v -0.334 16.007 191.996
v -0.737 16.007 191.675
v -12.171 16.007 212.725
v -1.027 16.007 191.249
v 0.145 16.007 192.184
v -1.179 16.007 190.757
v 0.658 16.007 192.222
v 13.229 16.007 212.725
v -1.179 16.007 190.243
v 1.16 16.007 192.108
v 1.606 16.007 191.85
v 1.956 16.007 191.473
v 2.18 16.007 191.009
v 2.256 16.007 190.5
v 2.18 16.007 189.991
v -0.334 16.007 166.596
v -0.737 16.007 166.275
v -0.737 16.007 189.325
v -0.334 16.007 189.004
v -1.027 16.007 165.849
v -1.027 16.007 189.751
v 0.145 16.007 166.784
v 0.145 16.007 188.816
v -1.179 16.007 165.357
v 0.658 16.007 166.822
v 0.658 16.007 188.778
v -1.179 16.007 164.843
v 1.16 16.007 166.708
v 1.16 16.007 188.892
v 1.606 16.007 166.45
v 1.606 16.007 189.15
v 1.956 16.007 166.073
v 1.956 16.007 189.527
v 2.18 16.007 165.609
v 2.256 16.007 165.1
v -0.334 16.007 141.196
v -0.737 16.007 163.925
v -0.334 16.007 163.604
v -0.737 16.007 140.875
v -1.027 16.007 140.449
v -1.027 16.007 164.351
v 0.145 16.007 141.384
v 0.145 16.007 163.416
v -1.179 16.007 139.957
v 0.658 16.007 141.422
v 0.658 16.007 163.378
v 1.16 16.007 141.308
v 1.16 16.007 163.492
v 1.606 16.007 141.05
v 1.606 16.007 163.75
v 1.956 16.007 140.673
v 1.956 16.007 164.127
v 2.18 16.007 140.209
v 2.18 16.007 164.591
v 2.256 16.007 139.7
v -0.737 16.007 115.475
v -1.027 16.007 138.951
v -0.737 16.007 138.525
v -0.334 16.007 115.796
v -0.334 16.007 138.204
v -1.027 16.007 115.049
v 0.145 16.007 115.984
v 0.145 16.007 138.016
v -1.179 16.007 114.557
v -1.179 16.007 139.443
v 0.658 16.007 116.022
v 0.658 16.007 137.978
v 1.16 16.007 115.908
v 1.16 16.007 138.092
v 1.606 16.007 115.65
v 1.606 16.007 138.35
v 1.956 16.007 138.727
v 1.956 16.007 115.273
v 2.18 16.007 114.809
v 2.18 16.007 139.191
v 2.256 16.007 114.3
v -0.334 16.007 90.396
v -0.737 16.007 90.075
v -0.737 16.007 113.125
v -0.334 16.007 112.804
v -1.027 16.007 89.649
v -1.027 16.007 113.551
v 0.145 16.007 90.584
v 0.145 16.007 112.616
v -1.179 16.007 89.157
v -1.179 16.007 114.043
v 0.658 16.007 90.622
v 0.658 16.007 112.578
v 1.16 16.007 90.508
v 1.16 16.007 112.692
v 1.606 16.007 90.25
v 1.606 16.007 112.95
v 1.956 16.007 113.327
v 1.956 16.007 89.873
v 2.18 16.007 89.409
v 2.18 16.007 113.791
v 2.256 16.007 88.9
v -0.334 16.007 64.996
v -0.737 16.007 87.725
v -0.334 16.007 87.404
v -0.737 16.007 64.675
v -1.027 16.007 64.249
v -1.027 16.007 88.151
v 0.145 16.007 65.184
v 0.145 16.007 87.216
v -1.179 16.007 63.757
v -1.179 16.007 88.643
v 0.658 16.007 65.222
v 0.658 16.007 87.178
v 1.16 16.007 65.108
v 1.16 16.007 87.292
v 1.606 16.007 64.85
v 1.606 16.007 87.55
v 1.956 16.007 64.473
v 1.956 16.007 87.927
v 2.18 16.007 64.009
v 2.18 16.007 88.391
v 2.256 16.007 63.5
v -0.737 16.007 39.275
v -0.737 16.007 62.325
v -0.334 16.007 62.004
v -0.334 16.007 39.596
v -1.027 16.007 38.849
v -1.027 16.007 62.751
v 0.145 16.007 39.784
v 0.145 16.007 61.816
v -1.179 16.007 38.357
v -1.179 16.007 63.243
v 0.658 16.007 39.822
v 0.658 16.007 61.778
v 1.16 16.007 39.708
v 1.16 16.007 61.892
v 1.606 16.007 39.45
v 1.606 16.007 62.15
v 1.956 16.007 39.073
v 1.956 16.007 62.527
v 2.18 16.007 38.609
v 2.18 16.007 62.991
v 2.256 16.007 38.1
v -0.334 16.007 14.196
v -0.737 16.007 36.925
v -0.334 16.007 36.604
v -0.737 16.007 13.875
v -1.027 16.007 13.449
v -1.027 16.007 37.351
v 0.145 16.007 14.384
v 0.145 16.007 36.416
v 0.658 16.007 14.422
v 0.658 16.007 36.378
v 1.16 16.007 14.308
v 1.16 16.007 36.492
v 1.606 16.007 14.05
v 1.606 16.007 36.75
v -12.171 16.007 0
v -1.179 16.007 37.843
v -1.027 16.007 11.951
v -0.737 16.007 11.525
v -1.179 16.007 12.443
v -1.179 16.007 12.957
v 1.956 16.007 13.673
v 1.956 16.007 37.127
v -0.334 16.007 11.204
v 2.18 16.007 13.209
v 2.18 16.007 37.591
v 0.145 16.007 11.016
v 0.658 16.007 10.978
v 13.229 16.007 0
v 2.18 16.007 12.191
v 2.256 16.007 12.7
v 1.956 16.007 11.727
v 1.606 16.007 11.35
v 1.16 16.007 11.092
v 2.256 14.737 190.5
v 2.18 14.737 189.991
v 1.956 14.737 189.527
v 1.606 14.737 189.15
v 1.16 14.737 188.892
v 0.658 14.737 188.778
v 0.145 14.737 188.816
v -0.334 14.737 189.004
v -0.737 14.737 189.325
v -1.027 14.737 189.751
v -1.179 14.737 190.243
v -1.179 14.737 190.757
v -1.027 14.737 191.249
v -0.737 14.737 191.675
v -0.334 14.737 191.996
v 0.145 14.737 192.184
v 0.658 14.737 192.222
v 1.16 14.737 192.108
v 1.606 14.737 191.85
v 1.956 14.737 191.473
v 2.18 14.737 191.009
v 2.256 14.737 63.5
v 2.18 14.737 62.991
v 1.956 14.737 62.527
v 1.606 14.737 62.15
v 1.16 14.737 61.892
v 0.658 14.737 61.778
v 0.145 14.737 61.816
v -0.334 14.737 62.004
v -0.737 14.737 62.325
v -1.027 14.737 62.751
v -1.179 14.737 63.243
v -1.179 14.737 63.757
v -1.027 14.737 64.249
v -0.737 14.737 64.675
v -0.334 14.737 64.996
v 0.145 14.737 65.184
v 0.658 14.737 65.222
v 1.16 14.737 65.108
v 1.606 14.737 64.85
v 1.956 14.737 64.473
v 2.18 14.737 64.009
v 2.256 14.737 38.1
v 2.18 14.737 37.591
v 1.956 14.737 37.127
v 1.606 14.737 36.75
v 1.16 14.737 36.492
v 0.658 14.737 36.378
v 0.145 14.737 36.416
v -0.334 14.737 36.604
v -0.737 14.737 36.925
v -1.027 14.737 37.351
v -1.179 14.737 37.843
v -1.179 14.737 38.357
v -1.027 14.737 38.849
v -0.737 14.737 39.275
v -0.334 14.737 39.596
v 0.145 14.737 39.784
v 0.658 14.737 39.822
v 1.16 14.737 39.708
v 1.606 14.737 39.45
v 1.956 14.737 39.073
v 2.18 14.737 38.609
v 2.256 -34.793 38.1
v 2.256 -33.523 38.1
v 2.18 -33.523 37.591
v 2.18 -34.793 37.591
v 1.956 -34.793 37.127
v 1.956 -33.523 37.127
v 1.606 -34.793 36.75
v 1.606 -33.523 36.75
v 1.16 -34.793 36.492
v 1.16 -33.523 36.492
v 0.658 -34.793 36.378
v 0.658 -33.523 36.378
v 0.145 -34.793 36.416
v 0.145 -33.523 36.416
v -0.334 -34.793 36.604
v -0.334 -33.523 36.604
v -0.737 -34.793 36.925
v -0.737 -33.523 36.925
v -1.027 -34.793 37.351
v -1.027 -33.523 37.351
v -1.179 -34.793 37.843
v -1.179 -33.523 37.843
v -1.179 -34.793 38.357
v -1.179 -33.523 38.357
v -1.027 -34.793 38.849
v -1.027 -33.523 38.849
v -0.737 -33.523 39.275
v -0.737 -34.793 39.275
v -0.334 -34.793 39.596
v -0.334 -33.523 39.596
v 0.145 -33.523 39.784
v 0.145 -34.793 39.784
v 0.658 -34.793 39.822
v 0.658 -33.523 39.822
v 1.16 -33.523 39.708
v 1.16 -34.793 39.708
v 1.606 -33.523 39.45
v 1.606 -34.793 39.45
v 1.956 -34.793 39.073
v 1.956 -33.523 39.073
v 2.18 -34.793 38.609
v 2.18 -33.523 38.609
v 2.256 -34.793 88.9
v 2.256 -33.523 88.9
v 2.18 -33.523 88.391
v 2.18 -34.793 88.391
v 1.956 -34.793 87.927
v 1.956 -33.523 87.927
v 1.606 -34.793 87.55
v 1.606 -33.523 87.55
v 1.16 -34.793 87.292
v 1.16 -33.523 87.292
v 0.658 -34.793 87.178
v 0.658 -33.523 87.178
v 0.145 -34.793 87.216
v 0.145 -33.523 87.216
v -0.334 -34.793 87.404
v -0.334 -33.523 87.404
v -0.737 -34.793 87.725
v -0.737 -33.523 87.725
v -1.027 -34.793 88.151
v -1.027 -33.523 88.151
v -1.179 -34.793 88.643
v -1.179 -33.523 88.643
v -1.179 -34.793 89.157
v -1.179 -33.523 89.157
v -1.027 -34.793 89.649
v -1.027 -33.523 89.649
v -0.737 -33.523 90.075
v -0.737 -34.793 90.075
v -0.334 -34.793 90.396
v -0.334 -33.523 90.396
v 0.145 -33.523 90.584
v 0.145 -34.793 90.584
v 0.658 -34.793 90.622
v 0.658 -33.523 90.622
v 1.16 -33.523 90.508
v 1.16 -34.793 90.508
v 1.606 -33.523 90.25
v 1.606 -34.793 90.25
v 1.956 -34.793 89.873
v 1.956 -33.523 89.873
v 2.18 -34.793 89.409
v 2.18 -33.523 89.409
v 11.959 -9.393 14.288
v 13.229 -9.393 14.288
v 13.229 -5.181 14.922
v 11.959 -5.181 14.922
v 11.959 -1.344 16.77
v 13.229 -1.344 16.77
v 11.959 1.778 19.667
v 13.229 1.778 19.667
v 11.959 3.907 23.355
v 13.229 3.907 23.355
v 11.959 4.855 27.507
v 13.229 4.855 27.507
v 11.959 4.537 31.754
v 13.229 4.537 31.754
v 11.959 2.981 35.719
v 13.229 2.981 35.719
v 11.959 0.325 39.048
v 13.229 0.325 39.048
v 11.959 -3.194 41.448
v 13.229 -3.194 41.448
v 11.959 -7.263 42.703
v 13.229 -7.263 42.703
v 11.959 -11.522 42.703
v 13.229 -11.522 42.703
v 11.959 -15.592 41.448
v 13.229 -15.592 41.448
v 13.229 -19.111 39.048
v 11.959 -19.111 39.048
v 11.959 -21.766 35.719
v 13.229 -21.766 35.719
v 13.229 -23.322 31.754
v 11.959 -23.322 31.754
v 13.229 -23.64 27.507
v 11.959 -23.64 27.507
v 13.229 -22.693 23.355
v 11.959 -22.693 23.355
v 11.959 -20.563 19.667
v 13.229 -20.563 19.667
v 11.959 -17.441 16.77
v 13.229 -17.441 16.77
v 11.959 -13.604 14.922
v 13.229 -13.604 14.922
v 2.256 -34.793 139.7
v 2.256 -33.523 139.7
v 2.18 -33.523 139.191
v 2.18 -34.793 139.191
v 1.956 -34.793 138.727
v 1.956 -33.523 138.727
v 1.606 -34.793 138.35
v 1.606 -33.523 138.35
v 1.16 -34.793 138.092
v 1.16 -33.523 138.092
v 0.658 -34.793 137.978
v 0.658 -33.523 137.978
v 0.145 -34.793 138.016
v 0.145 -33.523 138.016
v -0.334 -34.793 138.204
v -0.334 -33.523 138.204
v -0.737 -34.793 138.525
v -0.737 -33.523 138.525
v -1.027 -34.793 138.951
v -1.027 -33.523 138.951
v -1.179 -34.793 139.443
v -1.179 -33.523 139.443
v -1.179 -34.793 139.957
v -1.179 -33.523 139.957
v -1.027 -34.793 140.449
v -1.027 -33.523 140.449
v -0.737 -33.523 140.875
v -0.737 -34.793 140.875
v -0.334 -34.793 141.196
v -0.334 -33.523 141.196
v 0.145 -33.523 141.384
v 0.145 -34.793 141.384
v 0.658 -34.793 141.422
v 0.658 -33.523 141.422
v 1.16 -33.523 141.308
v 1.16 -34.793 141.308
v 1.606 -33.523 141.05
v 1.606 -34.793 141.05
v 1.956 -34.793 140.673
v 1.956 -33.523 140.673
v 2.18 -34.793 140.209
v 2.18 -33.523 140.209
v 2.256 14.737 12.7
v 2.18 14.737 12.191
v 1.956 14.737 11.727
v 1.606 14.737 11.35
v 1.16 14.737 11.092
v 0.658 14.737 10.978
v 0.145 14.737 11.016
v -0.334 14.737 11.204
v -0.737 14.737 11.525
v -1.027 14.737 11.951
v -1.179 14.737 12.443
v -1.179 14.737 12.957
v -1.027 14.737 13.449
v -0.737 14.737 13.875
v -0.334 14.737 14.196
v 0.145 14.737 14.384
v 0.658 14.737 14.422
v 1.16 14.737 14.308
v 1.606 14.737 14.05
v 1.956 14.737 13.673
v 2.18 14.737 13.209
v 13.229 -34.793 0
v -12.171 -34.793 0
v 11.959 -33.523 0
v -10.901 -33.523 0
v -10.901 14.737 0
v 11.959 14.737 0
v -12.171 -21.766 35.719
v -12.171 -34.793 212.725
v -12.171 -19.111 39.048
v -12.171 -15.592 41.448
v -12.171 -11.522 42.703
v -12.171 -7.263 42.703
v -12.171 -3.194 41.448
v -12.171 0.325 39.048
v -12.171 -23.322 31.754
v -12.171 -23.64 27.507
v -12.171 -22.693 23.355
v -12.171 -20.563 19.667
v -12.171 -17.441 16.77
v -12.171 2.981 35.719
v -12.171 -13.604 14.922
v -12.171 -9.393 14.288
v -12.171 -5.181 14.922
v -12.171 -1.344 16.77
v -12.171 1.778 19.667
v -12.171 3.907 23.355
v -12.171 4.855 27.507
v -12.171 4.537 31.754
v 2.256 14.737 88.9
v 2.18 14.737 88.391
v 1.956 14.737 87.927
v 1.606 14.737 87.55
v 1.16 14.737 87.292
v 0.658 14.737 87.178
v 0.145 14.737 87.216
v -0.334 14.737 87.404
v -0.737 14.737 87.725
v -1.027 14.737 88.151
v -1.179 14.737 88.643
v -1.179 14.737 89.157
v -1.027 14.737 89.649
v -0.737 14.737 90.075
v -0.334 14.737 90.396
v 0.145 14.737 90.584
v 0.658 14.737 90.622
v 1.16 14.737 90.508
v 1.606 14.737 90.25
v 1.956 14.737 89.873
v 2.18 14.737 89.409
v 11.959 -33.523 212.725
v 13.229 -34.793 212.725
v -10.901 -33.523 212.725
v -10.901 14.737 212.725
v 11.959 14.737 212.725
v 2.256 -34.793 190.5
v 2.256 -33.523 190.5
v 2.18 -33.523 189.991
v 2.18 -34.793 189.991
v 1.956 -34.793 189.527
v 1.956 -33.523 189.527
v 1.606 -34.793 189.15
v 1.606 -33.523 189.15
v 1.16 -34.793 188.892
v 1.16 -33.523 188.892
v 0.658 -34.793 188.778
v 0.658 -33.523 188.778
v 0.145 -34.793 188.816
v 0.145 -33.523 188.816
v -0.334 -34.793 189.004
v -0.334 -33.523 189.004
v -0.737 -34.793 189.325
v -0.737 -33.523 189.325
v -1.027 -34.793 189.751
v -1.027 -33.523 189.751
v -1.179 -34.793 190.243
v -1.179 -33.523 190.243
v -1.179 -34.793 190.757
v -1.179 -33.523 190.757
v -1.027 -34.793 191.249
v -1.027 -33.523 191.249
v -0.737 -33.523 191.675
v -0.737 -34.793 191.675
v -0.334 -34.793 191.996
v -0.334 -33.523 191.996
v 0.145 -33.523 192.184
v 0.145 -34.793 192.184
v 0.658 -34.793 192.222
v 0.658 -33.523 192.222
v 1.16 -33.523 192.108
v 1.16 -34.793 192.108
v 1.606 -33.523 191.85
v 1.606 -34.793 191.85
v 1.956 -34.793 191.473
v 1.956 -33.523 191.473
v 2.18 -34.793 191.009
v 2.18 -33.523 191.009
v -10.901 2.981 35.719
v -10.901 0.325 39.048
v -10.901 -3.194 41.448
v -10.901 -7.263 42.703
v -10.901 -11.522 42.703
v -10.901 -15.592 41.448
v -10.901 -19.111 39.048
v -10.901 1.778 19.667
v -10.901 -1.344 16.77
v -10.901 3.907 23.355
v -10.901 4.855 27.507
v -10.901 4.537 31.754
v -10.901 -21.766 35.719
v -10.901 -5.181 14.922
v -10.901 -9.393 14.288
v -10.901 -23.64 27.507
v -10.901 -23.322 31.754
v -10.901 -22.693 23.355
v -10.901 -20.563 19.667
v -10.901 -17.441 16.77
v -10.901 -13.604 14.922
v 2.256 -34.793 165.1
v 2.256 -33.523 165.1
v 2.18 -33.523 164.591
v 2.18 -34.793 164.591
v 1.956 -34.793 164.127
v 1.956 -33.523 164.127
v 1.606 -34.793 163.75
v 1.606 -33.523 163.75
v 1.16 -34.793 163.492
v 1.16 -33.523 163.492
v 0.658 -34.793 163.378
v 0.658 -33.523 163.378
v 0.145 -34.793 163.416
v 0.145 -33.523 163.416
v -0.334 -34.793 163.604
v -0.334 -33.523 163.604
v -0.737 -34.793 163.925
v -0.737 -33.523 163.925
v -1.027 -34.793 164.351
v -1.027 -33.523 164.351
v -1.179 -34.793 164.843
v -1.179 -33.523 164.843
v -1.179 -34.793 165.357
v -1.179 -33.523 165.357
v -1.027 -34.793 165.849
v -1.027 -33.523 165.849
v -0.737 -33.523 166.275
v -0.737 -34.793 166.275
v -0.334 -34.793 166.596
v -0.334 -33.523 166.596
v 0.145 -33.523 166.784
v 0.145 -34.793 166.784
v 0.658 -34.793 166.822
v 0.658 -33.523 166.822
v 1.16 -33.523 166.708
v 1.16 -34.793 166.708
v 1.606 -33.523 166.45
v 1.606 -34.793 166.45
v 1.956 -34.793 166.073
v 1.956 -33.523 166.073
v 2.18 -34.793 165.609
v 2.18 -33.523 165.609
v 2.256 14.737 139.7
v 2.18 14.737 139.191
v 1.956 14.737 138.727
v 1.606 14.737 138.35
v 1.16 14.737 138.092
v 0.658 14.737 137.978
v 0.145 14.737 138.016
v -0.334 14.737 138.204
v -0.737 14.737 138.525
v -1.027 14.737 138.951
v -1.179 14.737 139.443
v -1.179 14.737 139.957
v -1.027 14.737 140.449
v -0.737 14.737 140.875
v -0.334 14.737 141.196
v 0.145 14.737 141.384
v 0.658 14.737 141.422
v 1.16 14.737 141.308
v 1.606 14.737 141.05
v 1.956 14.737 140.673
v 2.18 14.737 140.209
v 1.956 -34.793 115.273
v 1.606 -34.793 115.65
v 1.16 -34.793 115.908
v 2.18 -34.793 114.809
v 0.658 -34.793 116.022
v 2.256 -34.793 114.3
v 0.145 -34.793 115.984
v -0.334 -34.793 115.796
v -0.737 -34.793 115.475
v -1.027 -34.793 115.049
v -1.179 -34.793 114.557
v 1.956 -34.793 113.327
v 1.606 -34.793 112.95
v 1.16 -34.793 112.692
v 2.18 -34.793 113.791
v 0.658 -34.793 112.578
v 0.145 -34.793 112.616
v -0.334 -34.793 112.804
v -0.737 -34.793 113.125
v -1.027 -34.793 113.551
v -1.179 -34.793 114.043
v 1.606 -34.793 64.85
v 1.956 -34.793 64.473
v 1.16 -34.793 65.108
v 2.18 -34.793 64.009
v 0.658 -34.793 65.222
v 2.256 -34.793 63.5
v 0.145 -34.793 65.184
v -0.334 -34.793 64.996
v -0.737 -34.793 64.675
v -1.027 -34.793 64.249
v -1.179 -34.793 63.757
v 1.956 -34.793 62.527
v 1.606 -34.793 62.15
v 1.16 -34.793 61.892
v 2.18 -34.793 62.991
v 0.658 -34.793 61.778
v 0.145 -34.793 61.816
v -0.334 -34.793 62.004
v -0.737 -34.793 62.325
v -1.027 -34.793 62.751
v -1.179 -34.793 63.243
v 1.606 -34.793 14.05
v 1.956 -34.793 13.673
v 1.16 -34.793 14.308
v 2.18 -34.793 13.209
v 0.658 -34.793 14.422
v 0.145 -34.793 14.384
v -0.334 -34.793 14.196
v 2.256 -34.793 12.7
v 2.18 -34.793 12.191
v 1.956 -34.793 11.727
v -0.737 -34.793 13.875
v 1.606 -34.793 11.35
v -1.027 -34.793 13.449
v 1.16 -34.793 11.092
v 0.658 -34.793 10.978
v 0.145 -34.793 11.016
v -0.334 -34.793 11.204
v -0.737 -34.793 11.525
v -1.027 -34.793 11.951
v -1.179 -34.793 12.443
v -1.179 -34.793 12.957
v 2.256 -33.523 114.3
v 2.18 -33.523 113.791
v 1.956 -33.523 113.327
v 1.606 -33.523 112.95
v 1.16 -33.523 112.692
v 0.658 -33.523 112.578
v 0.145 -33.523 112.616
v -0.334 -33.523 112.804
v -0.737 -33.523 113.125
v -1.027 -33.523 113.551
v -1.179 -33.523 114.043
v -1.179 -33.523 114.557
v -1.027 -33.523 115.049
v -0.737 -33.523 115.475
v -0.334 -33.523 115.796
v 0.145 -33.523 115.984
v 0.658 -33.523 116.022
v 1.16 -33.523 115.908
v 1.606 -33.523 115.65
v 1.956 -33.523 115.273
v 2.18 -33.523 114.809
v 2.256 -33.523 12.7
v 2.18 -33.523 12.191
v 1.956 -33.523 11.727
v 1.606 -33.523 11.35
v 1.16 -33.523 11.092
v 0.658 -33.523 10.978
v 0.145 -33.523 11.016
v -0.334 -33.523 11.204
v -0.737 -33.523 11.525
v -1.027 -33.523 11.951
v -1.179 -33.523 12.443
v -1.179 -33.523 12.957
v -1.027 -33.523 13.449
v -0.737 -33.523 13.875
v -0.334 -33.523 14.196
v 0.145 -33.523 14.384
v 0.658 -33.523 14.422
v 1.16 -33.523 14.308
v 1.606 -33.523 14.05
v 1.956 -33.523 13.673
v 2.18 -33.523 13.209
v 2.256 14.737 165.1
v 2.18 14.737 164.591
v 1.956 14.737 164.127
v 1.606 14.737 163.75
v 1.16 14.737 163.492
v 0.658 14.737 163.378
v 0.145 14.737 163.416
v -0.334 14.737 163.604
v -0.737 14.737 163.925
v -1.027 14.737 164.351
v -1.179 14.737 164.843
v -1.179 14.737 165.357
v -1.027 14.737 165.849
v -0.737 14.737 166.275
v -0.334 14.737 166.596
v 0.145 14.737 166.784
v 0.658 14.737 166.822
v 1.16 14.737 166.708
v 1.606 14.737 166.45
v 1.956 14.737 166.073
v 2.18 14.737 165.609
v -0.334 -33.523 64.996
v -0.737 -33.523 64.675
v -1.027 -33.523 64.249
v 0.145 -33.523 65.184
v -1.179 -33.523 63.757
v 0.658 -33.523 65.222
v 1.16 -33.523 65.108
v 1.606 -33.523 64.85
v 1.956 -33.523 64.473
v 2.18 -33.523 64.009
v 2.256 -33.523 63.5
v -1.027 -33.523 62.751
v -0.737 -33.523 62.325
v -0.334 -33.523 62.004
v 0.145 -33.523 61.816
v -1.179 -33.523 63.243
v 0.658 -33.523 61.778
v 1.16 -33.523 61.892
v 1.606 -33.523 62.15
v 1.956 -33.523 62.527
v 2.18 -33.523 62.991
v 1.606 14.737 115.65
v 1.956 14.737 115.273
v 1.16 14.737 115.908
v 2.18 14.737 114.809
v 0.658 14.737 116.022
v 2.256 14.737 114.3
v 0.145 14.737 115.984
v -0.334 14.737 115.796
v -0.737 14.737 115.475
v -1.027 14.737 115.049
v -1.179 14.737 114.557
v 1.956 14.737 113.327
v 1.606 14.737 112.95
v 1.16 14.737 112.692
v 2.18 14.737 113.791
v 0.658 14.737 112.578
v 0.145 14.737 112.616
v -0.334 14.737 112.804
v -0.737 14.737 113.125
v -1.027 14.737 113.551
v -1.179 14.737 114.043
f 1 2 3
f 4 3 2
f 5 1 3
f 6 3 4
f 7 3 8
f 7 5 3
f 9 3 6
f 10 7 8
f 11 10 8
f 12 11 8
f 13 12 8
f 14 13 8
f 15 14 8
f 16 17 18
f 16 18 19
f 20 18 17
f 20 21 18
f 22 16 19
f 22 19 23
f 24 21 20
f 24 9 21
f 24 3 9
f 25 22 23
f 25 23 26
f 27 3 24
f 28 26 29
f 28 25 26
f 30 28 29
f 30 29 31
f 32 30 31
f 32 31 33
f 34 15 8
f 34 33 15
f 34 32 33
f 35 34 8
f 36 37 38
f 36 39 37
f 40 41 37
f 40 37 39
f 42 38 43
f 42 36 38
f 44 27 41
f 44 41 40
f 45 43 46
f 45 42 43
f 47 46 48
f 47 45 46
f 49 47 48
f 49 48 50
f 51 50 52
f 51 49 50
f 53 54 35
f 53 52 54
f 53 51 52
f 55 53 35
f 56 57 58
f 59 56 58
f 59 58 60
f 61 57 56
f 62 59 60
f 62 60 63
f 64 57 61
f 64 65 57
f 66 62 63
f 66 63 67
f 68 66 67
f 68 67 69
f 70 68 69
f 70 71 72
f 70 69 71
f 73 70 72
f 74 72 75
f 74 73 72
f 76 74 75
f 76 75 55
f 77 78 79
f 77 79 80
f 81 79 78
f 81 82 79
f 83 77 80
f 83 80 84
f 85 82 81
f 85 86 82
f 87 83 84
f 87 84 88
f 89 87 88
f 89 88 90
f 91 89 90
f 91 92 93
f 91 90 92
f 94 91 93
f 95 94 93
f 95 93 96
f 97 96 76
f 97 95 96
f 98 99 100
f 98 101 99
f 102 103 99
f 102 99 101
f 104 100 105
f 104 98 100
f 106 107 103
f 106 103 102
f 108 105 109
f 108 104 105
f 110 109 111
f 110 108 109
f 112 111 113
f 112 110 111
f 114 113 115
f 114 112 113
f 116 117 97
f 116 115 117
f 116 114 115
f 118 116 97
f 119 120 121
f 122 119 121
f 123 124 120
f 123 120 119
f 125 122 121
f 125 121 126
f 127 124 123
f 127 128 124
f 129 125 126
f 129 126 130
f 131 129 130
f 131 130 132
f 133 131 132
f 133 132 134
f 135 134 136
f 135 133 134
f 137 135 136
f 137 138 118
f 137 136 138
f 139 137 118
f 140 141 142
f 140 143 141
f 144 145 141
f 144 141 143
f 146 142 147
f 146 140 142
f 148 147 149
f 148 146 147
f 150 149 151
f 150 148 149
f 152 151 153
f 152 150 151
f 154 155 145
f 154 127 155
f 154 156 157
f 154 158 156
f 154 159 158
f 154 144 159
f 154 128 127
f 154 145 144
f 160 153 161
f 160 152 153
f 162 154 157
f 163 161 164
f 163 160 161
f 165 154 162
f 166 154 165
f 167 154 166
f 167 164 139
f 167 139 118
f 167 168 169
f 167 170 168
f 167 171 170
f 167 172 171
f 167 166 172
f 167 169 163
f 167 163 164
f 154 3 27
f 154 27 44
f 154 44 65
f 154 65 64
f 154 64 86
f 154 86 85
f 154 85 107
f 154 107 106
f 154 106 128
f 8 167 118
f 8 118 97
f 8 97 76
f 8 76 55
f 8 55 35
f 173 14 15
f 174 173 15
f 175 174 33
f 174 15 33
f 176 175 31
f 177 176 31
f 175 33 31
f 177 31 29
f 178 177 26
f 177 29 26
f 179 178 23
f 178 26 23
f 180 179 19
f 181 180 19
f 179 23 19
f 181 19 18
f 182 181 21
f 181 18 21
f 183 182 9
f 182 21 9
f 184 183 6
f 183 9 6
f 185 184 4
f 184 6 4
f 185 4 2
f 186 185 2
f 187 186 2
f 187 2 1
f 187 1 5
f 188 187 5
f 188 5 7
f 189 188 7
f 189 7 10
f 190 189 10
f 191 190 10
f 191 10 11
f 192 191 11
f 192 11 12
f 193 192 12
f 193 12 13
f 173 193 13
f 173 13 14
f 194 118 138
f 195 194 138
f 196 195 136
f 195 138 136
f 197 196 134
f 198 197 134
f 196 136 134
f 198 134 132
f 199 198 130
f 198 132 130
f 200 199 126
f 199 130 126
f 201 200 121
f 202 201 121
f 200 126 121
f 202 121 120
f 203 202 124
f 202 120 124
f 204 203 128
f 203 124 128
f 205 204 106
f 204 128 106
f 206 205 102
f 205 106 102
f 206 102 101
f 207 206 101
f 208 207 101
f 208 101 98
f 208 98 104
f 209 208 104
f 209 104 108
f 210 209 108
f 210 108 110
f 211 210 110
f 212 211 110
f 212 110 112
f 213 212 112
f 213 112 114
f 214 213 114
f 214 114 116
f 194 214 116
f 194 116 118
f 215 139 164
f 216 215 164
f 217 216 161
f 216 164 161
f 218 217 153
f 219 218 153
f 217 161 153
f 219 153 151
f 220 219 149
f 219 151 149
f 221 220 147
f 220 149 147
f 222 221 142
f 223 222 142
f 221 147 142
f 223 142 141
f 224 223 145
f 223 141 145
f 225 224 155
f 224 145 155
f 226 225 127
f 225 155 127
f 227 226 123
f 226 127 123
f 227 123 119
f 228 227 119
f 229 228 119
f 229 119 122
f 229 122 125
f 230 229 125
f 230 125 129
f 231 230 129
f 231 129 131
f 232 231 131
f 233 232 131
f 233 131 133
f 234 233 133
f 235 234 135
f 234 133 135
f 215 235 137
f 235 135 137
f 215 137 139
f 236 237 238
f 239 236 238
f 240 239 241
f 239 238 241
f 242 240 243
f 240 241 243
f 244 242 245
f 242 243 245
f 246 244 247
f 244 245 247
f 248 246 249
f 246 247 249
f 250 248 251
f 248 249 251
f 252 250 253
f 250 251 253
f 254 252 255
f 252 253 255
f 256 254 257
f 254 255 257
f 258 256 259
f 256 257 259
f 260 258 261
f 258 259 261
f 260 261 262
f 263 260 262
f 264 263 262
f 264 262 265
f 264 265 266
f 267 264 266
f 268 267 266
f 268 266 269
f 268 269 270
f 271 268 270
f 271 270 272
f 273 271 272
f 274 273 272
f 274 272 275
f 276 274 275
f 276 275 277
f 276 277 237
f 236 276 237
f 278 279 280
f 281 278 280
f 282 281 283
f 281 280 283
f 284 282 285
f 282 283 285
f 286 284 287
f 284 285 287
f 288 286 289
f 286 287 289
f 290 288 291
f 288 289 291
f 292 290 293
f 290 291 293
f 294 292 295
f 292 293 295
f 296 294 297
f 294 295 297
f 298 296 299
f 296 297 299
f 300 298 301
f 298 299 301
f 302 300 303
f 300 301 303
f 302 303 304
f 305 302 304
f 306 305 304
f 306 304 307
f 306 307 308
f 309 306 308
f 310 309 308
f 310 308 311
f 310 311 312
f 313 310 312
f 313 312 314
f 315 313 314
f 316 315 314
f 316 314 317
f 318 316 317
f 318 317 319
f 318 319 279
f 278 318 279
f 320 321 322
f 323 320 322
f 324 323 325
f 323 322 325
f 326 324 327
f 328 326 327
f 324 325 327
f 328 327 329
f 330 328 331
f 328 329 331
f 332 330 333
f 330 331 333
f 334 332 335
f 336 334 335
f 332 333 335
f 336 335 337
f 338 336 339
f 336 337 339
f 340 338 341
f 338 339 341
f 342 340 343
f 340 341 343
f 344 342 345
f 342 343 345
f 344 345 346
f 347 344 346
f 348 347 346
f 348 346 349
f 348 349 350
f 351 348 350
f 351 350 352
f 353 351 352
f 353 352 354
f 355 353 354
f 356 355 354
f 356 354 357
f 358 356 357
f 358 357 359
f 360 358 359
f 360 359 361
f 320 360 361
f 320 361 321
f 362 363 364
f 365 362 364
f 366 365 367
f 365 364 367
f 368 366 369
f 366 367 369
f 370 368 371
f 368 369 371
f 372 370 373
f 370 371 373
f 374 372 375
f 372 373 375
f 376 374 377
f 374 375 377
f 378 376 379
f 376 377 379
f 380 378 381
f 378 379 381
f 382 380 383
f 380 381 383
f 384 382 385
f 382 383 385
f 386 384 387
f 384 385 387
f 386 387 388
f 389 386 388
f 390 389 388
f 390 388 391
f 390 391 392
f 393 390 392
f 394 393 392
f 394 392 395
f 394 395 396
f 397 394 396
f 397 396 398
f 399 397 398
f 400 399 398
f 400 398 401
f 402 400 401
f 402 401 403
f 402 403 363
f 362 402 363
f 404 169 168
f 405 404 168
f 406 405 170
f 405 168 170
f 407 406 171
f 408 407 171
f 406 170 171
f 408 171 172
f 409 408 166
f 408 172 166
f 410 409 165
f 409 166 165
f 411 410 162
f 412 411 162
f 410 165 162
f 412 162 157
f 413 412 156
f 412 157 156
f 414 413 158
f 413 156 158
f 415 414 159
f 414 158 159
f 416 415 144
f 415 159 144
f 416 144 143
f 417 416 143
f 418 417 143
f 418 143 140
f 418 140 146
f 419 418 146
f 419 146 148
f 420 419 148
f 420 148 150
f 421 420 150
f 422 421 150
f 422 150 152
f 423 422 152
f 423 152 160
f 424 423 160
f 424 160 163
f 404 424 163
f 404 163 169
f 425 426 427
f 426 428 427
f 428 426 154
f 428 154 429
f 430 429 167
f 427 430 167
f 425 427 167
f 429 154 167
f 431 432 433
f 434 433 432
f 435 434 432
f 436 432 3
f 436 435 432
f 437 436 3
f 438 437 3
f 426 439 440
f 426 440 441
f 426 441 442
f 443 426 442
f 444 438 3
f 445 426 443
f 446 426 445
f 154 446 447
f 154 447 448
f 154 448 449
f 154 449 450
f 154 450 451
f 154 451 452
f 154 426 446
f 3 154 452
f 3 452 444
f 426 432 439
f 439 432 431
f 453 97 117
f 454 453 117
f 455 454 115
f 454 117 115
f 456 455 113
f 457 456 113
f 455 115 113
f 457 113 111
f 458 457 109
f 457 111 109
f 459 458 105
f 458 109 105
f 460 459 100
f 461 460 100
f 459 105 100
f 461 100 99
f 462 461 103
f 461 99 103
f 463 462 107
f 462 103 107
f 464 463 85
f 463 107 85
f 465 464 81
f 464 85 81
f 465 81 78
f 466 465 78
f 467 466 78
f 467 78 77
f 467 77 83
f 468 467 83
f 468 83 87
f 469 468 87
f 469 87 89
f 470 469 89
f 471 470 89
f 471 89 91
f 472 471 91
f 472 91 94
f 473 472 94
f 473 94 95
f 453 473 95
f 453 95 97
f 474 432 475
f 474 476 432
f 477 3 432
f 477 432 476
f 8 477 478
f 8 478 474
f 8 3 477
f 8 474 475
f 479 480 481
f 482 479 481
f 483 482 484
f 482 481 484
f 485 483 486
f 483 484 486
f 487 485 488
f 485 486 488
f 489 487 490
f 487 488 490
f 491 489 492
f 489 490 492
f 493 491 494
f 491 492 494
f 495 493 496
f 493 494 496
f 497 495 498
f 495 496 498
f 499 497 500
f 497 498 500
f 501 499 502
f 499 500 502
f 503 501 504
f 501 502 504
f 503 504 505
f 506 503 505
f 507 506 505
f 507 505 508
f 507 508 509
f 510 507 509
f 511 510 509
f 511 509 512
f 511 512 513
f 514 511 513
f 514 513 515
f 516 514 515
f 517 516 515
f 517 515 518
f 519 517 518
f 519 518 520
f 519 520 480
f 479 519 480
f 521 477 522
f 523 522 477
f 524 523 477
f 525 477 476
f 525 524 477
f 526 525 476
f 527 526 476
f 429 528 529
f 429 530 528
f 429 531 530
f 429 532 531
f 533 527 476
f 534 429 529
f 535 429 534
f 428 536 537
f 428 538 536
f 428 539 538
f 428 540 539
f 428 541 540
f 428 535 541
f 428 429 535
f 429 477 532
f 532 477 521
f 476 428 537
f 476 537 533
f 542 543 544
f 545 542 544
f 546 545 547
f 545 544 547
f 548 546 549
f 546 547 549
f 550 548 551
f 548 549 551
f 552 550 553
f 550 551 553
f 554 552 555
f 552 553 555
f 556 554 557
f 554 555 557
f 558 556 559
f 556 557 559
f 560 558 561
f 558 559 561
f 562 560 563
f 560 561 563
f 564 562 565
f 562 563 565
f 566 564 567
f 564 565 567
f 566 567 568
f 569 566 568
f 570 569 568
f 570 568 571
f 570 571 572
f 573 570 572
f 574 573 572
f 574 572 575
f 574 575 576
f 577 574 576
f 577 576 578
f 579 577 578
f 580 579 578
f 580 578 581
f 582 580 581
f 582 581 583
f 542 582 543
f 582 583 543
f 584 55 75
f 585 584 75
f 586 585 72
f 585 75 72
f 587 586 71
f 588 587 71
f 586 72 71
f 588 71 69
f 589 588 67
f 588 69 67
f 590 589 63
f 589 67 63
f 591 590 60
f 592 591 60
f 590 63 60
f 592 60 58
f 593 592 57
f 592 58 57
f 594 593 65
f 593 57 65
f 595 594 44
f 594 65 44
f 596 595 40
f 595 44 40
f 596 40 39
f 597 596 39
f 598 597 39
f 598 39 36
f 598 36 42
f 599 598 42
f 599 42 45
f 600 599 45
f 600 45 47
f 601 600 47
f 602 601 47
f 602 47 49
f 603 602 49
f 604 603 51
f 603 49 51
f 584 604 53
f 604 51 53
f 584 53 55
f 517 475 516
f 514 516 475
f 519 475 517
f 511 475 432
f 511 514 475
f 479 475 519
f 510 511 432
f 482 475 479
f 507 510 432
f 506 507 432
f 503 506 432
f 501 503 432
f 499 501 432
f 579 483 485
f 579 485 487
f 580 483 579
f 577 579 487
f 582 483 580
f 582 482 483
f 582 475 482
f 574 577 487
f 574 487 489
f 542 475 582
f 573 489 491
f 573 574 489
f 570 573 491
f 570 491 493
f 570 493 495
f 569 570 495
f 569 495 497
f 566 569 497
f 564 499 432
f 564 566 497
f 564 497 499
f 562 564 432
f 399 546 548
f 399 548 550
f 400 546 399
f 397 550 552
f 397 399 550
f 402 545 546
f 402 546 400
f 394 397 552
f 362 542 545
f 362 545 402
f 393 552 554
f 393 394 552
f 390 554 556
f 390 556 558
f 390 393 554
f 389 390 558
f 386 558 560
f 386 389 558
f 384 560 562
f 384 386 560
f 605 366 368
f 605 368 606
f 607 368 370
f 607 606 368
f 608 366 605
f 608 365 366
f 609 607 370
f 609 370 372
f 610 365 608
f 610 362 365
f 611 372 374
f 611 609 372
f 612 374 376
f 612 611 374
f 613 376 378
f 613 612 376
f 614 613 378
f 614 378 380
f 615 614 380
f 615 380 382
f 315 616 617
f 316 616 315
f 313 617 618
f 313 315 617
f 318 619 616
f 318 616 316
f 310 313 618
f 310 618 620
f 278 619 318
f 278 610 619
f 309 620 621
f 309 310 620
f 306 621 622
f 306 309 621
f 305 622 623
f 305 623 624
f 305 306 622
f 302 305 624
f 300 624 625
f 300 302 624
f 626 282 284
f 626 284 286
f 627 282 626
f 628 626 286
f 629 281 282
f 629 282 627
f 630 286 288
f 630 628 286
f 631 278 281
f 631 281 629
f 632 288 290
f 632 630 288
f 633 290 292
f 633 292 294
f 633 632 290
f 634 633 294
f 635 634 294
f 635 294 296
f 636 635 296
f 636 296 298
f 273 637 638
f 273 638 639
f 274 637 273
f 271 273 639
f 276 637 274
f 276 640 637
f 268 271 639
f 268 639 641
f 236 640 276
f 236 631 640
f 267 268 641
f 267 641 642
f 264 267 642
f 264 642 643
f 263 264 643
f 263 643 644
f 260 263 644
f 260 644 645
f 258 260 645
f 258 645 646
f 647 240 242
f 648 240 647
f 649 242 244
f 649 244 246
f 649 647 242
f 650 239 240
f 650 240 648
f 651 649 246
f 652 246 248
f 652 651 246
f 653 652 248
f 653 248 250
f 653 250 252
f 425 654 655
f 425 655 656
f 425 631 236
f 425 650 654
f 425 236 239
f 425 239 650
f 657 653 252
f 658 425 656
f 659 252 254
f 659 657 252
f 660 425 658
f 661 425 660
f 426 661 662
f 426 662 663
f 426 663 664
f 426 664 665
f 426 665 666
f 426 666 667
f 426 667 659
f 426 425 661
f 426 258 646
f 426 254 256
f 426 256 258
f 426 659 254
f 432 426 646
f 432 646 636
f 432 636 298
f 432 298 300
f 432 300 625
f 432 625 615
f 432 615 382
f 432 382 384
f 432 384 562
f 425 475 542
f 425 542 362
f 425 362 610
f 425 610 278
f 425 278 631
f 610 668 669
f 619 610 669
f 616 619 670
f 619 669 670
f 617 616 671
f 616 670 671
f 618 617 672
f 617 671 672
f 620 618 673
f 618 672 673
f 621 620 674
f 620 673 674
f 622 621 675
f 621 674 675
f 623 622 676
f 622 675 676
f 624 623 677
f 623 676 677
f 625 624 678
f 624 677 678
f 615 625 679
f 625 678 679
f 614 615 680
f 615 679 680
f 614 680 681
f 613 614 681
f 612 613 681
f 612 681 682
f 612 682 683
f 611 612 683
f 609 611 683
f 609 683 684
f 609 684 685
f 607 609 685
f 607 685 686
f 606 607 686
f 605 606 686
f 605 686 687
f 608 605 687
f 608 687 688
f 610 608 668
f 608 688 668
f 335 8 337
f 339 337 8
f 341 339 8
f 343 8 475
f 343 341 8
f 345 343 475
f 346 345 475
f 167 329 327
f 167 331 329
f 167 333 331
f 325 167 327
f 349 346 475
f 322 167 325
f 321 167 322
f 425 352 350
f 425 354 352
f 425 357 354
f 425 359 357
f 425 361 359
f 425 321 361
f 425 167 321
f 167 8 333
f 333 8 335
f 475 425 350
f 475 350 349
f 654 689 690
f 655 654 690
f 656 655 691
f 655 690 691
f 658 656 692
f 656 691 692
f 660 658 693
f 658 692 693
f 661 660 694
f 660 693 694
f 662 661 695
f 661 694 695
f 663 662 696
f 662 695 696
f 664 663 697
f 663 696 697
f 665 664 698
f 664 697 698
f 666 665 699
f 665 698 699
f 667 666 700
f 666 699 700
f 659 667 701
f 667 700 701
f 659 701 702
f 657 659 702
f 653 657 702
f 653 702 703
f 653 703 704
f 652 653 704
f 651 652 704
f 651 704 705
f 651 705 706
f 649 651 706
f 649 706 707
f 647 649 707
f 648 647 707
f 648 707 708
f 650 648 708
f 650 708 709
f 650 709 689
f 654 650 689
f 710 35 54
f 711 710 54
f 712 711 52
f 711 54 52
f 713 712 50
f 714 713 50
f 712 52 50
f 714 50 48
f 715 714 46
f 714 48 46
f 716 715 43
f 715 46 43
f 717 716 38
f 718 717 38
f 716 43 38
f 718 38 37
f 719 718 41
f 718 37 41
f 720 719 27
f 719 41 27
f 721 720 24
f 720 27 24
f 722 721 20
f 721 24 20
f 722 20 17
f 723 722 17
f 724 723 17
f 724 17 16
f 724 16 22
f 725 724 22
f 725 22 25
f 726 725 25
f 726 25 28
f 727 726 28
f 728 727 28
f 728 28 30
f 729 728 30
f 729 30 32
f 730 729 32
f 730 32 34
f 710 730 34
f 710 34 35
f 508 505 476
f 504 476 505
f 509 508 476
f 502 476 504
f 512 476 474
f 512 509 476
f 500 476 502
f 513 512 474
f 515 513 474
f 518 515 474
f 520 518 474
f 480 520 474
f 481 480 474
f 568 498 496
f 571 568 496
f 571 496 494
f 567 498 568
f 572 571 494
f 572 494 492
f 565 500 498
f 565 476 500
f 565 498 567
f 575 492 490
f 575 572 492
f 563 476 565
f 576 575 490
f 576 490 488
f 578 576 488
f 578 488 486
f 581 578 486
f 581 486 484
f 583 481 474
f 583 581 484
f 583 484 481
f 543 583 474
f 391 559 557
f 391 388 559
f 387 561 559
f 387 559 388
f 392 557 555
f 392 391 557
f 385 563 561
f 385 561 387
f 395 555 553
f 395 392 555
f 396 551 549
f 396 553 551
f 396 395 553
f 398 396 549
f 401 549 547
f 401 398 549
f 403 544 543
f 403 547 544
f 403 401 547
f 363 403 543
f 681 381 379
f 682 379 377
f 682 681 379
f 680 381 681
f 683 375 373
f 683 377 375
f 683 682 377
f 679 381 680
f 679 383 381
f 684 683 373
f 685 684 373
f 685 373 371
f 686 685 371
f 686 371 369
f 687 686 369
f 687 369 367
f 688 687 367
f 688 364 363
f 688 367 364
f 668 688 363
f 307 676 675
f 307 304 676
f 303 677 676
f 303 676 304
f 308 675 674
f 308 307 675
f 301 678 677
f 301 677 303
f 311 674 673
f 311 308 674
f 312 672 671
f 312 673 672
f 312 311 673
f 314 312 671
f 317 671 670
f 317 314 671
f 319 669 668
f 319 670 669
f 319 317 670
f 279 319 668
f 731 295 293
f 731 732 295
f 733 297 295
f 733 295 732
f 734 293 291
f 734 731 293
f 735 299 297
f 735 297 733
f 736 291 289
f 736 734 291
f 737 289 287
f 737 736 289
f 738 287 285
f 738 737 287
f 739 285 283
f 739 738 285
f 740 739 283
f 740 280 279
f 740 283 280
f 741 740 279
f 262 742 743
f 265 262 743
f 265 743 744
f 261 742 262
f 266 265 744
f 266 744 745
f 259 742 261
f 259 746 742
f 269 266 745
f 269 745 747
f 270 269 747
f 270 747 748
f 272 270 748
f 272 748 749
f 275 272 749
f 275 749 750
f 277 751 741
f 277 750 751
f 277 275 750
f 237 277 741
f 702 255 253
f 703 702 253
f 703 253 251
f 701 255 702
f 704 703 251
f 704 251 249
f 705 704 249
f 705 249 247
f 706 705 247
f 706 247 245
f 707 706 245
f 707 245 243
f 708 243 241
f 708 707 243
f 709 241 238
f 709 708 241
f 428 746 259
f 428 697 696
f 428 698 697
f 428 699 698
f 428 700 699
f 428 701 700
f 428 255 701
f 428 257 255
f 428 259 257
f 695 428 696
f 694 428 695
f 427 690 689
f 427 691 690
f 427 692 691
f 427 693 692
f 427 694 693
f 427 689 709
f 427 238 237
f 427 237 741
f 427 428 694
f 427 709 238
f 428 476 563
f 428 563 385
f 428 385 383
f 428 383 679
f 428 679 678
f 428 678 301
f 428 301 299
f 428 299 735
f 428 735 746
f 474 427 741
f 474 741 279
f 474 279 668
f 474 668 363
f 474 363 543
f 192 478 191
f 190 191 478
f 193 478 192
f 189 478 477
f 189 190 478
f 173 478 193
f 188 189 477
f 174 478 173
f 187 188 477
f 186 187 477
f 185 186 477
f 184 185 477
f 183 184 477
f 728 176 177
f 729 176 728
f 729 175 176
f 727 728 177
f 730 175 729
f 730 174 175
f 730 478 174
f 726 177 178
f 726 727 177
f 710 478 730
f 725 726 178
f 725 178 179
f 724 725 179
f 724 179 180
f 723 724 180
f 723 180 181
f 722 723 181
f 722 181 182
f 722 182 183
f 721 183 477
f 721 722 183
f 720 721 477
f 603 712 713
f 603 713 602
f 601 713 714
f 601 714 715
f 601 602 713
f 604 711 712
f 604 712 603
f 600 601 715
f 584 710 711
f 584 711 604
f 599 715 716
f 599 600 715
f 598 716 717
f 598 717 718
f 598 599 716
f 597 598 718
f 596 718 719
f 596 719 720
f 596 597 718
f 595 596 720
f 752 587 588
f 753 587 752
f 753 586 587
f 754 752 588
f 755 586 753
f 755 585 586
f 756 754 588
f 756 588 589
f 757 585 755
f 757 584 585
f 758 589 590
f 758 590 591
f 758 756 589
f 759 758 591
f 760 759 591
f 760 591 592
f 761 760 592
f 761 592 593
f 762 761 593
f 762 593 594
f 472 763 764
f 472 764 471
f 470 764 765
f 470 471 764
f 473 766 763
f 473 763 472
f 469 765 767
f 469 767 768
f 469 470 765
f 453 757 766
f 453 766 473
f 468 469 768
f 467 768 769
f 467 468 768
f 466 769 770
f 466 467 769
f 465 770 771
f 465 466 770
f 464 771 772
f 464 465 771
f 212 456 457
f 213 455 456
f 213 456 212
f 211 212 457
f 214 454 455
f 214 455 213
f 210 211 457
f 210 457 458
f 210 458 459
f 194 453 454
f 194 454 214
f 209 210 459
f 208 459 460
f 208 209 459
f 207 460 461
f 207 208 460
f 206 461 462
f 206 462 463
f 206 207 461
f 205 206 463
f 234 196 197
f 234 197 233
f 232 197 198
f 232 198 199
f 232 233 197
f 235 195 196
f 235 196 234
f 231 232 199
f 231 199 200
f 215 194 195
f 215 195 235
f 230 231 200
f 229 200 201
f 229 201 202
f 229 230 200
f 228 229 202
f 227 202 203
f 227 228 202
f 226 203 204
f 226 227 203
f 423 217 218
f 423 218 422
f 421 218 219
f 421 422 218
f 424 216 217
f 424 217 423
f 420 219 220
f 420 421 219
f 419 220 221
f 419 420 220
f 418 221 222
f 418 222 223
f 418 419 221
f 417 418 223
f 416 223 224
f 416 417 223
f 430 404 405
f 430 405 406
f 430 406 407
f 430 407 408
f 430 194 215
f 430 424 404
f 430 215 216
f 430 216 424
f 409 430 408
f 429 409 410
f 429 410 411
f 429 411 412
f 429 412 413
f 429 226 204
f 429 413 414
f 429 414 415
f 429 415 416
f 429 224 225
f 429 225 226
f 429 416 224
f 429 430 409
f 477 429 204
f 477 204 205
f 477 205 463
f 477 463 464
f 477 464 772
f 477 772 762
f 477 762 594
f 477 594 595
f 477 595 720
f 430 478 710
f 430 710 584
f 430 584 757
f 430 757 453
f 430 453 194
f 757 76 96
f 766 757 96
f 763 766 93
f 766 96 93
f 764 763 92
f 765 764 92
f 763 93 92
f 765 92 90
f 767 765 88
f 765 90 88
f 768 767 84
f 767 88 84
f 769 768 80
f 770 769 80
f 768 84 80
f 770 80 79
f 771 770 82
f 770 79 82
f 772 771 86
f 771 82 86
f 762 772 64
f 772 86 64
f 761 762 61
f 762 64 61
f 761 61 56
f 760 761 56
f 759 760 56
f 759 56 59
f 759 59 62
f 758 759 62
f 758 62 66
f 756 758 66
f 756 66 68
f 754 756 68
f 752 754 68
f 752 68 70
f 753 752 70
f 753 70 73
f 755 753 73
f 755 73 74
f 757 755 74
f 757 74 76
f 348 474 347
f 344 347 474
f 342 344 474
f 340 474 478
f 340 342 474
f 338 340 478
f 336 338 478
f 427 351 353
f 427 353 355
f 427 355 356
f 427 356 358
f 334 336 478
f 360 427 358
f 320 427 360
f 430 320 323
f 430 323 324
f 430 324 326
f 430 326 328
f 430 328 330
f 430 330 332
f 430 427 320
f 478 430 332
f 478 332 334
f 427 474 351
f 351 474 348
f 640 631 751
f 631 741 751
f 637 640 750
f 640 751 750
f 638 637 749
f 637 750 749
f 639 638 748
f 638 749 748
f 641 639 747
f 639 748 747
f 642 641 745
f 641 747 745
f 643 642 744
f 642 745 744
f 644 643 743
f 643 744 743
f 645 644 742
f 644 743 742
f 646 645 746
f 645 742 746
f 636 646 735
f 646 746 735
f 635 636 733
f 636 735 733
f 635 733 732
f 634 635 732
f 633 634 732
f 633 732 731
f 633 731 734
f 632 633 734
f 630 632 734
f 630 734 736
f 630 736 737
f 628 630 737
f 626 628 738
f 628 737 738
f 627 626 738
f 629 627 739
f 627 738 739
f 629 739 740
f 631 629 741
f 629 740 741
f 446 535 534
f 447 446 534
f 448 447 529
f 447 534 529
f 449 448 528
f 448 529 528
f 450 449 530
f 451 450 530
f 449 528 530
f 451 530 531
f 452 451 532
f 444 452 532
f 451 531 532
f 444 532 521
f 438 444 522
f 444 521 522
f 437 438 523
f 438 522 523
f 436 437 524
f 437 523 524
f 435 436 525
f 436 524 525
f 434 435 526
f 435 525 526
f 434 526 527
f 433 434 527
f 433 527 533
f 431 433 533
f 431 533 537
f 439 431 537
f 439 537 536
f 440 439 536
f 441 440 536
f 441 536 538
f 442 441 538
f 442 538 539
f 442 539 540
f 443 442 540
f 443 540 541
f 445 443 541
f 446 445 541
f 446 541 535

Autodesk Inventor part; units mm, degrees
ref_plane "YZ Plane" through (0, 0, 0) normal (1, 0, 0) x (0, 1, 0)
ref_plane "XZ Plane" through (0, 0, 0) normal (0, 1, 0) x (-1, 0, 0)
ref_plane "XY Plane" through (0, 0, 0) normal (0, 0, 1) x (1, 0, 0)
sketch "Sketch1" plane through (0, 0, 0) normal (0, 0, 1) x (1, 0, 0)
  line L0 (-12.1708, 16.0073) -> (13.2292, 16.0073)
  line L1 (13.2292, 16.0073) -> (13.2292, -34.7927)
  line L2 (13.2292, -34.7927) -> (-12.1708, -34.7927)
  line L3 (-12.1708, -34.7927) -> (-12.1708, 16.0073)
  line L4 (11.9592, 14.7373) -> (-10.9008, 14.7373)
  line L5 (-10.9008, 14.7373) -> (-10.9008, -33.5227)
  line L6 (-10.9008, -33.5227) -> (11.9592, -33.5227)
  line L7 (11.9592, -33.5227) -> (11.9592, 14.7373)
  point P0 (0, 0)
  dimension "d0" = 25.4
  dimension "d1" = 50.8
  dimension "d2" = 1.27
extrude "Extrusion1" add sketch "Sketch1" along normal blind 212.725
sketch "Sketch2" plane through (-12.1708, 16.0073, 0) normal (0, 1, 0) x (1, 0, 0)
  circle A0 centre (12.7, -12.7) radius 1.7272
  line L0 (25.4, 0) -> (0, 0) projected
  line L1 (0, 0) -> (0, -212.725) projected
  point P0 (12.1708, 0)
  dimension "d5" = 3.4544
  dimension "d6" = 12.7
  dimension "d7" = 12.7
extrude "Extrusion2" cut sketch "Sketch2" against normal through all
pattern_linear "Rectangular Pattern1" count 21 spacing 25.4 along (0, 0, 1) of "Extrusion2"
sketch "Sketch5" plane through (13.2292, -34.7927, 0) normal (1, 0, 0) x (0, 0, -1)
  line L0 (-212.725, 0) -> (-212.725, 50.8) projected
  line L1 (0, 50.8) -> (-212.725, 50.8) projected
  circle A0 centre (-28.575, 25.4) radius 14.2875
  line L2 (0, 0) -> (-212.725, 0) projected
  point P0 (0, 34.7927)
  dimension "d52" = 28.575
  dimension "d54" = 25.4
  dimension "d62" = 25.4
  dimension "d63" = 28.575
extrude "Extrusion5" cut sketch "Sketch5" against normal through all
equation "\"d3\" = d13"
equation "\"d10\" = d14"
equation "\"d13\" = 212.725"
equation "\"d14\" = d13"
equation "\"d32\" = 101.6"
properties part number "AIntakeSupport1"
